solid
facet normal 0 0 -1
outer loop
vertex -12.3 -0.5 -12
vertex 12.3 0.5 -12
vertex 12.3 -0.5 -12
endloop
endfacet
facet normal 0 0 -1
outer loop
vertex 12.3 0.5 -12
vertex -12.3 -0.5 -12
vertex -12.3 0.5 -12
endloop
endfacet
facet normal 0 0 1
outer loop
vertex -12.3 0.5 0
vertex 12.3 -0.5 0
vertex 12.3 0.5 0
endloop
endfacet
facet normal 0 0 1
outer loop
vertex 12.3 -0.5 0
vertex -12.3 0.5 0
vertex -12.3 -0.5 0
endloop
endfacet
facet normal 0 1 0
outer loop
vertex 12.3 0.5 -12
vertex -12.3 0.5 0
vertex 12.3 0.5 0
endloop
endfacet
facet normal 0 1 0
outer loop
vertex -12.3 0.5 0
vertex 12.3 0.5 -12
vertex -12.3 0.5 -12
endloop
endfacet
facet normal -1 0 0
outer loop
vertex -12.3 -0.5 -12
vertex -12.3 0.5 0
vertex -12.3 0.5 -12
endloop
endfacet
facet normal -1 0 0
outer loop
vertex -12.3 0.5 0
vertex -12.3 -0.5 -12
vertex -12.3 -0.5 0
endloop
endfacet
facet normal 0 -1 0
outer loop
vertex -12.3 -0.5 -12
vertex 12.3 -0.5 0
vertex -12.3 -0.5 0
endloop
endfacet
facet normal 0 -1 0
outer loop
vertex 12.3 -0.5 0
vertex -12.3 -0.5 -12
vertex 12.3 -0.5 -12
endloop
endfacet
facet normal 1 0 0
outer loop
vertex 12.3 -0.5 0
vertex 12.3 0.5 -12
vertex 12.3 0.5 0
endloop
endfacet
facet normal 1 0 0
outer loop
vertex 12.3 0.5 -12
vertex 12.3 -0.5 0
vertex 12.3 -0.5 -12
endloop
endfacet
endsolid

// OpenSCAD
// file: ../p/box.scad
use <../lib.scad>
function ldraw_lib__box() = [
// 0 Box 6 (six faces)
// 0 Name: box.dat
// 0 Author: James Jessiman
// 0 !LDRAW_ORG Primitive UPDATE 2002-05
// 0 !LICENSE Licensed under CC BY 4.0 : see CAreadme.txt
// 
// 0 BFC CERTIFY CCW
  [0,"BFC","CERTIFY"],
  [0,"BFC","CCW"],
// 
// 0 !HISTORY 2002-08-22 [sbliss] Applied BFC
// 0 !HISTORY 2002-11-30 [PTadmin] Official Update 2002-05
// 0 !HISTORY 2007-06-24 [PTadmin] Header formatted for Contributor Agreement
// 0 !HISTORY 2008-07-01 [PTadmin] Official Update 2008-01
// 
// 
// 2 24 1 1 1 -1 1 1
  [2,24,1,1,1,-1,1,1],
// 2 24 -1 1 1 -1 1 -1
  [2,24,-1,1,1,-1,1,-1],
// 2 24 -1 1 -1 1 1 -1
  [2,24,-1,1,-1,1,1,-1],
// 2 24 1 1 -1 1 1 1
  [2,24,1,1,-1,1,1,1],
// 2 24 1 -1 1 -1 -1 1
  [2,24,1,-1,1,-1,-1,1],
// 2 24 -1 -1 1 -1 -1 -1
  [2,24,-1,-1,1,-1,-1,-1],
// 2 24 -1 -1 -1 1 -1 -1
  [2,24,-1,-1,-1,1,-1,-1],
// 2 24 1 -1 -1 1 -1 1
  [2,24,1,-1,-1,1,-1,1],
// 2 24 1 -1 1 1 1 1
  [2,24,1,-1,1,1,1,1],
// 2 24 -1 -1 1 -1 1 1
  [2,24,-1,-1,1,-1,1,1],
// 2 24 1 -1 -1 1 1 -1
  [2,24,1,-1,-1,1,1,-1],
// 2 24 -1 -1 -1 -1 1 -1
  [2,24,-1,-1,-1,-1,1,-1],
// 4 16 1 1 1 1 1 -1 -1 1 -1 -1 1 1
  [4,16,1,1,1,1,1,-1,-1,1,-1,-1,1,1],
// 4 16 -1 -1 -1 1 -1 -1 1 -1 1 -1 -1 1
  [4,16,-1,-1,-1,1,-1,-1,1,-1,1,-1,-1,1],
// 4 16 -1 -1 1 1 -1 1 1 1 1 -1 1 1
  [4,16,-1,-1,1,1,-1,1,1,1,1,-1,1,1],
// 4 16 -1 -1 -1 -1 -1 1 -1 1 1 -1 1 -1
  [4,16,-1,-1,-1,-1,-1,1,-1,1,1,-1,1,-1],
// 4 16 1 -1 -1 -1 -1 -1 -1 1 -1 1 1 -1
  [4,16,1,-1,-1,-1,-1,-1,-1,1,-1,1,1,-1],
// 4 16 1 -1 1 1 -1 -1 1 1 -1 1 1 1
  [4,16,1,-1,1,1,-1,-1,1,1,-1,1,1,1],
// 0
];
module ldraw_lib__box(step=0, col=false, unit=2/5, alt=false, line=0.2, solid=!$preview)
    makepoly(ldraw_lib__box(), step=step, col=col, unit=unit, alt=alt, line=line, solid=solid);
ldraw_lib__box(line=0.2);
// main file
use <../lib.scad>
use <../p/box.scad>
function ldraw_lib__u9244() = [
// 0 ~Glass for Homemaker Stove Door
// 0 Name: u9244.dat
// 0 Author: Steffen [Steffen]
// 0 !LDRAW_ORG Part UPDATE 2016-01
// 0 !LICENSE Licensed under CC BY 4.0 : see CAreadme.txt
// 
// 0 BFC CERTIFY CCW
  [0,"BFC","CERTIFY"],
  [0,"BFC","CCW"],
// 
// 0 !HISTORY 2016-12-31 [PTadmin] Official Update 2016-01
// 
// 
// 1 16 0 15 0 30.75 0 0 0 15 0 0 0 1.25 box.dat
  [1,16,0,15,0,30.75,0,0,0,15,0,0,0,1.25, ldraw_lib__box()],
];
module ldraw_lib__u9244(step=0, col=false, unit=2/5, alt=false, line=0.2, solid=!$preview)
    makepoly(ldraw_lib__u9244(), step=step, col=col, unit=unit, alt=alt, line=line, solid=solid);
ldraw_lib__u9244(line=0.2);
